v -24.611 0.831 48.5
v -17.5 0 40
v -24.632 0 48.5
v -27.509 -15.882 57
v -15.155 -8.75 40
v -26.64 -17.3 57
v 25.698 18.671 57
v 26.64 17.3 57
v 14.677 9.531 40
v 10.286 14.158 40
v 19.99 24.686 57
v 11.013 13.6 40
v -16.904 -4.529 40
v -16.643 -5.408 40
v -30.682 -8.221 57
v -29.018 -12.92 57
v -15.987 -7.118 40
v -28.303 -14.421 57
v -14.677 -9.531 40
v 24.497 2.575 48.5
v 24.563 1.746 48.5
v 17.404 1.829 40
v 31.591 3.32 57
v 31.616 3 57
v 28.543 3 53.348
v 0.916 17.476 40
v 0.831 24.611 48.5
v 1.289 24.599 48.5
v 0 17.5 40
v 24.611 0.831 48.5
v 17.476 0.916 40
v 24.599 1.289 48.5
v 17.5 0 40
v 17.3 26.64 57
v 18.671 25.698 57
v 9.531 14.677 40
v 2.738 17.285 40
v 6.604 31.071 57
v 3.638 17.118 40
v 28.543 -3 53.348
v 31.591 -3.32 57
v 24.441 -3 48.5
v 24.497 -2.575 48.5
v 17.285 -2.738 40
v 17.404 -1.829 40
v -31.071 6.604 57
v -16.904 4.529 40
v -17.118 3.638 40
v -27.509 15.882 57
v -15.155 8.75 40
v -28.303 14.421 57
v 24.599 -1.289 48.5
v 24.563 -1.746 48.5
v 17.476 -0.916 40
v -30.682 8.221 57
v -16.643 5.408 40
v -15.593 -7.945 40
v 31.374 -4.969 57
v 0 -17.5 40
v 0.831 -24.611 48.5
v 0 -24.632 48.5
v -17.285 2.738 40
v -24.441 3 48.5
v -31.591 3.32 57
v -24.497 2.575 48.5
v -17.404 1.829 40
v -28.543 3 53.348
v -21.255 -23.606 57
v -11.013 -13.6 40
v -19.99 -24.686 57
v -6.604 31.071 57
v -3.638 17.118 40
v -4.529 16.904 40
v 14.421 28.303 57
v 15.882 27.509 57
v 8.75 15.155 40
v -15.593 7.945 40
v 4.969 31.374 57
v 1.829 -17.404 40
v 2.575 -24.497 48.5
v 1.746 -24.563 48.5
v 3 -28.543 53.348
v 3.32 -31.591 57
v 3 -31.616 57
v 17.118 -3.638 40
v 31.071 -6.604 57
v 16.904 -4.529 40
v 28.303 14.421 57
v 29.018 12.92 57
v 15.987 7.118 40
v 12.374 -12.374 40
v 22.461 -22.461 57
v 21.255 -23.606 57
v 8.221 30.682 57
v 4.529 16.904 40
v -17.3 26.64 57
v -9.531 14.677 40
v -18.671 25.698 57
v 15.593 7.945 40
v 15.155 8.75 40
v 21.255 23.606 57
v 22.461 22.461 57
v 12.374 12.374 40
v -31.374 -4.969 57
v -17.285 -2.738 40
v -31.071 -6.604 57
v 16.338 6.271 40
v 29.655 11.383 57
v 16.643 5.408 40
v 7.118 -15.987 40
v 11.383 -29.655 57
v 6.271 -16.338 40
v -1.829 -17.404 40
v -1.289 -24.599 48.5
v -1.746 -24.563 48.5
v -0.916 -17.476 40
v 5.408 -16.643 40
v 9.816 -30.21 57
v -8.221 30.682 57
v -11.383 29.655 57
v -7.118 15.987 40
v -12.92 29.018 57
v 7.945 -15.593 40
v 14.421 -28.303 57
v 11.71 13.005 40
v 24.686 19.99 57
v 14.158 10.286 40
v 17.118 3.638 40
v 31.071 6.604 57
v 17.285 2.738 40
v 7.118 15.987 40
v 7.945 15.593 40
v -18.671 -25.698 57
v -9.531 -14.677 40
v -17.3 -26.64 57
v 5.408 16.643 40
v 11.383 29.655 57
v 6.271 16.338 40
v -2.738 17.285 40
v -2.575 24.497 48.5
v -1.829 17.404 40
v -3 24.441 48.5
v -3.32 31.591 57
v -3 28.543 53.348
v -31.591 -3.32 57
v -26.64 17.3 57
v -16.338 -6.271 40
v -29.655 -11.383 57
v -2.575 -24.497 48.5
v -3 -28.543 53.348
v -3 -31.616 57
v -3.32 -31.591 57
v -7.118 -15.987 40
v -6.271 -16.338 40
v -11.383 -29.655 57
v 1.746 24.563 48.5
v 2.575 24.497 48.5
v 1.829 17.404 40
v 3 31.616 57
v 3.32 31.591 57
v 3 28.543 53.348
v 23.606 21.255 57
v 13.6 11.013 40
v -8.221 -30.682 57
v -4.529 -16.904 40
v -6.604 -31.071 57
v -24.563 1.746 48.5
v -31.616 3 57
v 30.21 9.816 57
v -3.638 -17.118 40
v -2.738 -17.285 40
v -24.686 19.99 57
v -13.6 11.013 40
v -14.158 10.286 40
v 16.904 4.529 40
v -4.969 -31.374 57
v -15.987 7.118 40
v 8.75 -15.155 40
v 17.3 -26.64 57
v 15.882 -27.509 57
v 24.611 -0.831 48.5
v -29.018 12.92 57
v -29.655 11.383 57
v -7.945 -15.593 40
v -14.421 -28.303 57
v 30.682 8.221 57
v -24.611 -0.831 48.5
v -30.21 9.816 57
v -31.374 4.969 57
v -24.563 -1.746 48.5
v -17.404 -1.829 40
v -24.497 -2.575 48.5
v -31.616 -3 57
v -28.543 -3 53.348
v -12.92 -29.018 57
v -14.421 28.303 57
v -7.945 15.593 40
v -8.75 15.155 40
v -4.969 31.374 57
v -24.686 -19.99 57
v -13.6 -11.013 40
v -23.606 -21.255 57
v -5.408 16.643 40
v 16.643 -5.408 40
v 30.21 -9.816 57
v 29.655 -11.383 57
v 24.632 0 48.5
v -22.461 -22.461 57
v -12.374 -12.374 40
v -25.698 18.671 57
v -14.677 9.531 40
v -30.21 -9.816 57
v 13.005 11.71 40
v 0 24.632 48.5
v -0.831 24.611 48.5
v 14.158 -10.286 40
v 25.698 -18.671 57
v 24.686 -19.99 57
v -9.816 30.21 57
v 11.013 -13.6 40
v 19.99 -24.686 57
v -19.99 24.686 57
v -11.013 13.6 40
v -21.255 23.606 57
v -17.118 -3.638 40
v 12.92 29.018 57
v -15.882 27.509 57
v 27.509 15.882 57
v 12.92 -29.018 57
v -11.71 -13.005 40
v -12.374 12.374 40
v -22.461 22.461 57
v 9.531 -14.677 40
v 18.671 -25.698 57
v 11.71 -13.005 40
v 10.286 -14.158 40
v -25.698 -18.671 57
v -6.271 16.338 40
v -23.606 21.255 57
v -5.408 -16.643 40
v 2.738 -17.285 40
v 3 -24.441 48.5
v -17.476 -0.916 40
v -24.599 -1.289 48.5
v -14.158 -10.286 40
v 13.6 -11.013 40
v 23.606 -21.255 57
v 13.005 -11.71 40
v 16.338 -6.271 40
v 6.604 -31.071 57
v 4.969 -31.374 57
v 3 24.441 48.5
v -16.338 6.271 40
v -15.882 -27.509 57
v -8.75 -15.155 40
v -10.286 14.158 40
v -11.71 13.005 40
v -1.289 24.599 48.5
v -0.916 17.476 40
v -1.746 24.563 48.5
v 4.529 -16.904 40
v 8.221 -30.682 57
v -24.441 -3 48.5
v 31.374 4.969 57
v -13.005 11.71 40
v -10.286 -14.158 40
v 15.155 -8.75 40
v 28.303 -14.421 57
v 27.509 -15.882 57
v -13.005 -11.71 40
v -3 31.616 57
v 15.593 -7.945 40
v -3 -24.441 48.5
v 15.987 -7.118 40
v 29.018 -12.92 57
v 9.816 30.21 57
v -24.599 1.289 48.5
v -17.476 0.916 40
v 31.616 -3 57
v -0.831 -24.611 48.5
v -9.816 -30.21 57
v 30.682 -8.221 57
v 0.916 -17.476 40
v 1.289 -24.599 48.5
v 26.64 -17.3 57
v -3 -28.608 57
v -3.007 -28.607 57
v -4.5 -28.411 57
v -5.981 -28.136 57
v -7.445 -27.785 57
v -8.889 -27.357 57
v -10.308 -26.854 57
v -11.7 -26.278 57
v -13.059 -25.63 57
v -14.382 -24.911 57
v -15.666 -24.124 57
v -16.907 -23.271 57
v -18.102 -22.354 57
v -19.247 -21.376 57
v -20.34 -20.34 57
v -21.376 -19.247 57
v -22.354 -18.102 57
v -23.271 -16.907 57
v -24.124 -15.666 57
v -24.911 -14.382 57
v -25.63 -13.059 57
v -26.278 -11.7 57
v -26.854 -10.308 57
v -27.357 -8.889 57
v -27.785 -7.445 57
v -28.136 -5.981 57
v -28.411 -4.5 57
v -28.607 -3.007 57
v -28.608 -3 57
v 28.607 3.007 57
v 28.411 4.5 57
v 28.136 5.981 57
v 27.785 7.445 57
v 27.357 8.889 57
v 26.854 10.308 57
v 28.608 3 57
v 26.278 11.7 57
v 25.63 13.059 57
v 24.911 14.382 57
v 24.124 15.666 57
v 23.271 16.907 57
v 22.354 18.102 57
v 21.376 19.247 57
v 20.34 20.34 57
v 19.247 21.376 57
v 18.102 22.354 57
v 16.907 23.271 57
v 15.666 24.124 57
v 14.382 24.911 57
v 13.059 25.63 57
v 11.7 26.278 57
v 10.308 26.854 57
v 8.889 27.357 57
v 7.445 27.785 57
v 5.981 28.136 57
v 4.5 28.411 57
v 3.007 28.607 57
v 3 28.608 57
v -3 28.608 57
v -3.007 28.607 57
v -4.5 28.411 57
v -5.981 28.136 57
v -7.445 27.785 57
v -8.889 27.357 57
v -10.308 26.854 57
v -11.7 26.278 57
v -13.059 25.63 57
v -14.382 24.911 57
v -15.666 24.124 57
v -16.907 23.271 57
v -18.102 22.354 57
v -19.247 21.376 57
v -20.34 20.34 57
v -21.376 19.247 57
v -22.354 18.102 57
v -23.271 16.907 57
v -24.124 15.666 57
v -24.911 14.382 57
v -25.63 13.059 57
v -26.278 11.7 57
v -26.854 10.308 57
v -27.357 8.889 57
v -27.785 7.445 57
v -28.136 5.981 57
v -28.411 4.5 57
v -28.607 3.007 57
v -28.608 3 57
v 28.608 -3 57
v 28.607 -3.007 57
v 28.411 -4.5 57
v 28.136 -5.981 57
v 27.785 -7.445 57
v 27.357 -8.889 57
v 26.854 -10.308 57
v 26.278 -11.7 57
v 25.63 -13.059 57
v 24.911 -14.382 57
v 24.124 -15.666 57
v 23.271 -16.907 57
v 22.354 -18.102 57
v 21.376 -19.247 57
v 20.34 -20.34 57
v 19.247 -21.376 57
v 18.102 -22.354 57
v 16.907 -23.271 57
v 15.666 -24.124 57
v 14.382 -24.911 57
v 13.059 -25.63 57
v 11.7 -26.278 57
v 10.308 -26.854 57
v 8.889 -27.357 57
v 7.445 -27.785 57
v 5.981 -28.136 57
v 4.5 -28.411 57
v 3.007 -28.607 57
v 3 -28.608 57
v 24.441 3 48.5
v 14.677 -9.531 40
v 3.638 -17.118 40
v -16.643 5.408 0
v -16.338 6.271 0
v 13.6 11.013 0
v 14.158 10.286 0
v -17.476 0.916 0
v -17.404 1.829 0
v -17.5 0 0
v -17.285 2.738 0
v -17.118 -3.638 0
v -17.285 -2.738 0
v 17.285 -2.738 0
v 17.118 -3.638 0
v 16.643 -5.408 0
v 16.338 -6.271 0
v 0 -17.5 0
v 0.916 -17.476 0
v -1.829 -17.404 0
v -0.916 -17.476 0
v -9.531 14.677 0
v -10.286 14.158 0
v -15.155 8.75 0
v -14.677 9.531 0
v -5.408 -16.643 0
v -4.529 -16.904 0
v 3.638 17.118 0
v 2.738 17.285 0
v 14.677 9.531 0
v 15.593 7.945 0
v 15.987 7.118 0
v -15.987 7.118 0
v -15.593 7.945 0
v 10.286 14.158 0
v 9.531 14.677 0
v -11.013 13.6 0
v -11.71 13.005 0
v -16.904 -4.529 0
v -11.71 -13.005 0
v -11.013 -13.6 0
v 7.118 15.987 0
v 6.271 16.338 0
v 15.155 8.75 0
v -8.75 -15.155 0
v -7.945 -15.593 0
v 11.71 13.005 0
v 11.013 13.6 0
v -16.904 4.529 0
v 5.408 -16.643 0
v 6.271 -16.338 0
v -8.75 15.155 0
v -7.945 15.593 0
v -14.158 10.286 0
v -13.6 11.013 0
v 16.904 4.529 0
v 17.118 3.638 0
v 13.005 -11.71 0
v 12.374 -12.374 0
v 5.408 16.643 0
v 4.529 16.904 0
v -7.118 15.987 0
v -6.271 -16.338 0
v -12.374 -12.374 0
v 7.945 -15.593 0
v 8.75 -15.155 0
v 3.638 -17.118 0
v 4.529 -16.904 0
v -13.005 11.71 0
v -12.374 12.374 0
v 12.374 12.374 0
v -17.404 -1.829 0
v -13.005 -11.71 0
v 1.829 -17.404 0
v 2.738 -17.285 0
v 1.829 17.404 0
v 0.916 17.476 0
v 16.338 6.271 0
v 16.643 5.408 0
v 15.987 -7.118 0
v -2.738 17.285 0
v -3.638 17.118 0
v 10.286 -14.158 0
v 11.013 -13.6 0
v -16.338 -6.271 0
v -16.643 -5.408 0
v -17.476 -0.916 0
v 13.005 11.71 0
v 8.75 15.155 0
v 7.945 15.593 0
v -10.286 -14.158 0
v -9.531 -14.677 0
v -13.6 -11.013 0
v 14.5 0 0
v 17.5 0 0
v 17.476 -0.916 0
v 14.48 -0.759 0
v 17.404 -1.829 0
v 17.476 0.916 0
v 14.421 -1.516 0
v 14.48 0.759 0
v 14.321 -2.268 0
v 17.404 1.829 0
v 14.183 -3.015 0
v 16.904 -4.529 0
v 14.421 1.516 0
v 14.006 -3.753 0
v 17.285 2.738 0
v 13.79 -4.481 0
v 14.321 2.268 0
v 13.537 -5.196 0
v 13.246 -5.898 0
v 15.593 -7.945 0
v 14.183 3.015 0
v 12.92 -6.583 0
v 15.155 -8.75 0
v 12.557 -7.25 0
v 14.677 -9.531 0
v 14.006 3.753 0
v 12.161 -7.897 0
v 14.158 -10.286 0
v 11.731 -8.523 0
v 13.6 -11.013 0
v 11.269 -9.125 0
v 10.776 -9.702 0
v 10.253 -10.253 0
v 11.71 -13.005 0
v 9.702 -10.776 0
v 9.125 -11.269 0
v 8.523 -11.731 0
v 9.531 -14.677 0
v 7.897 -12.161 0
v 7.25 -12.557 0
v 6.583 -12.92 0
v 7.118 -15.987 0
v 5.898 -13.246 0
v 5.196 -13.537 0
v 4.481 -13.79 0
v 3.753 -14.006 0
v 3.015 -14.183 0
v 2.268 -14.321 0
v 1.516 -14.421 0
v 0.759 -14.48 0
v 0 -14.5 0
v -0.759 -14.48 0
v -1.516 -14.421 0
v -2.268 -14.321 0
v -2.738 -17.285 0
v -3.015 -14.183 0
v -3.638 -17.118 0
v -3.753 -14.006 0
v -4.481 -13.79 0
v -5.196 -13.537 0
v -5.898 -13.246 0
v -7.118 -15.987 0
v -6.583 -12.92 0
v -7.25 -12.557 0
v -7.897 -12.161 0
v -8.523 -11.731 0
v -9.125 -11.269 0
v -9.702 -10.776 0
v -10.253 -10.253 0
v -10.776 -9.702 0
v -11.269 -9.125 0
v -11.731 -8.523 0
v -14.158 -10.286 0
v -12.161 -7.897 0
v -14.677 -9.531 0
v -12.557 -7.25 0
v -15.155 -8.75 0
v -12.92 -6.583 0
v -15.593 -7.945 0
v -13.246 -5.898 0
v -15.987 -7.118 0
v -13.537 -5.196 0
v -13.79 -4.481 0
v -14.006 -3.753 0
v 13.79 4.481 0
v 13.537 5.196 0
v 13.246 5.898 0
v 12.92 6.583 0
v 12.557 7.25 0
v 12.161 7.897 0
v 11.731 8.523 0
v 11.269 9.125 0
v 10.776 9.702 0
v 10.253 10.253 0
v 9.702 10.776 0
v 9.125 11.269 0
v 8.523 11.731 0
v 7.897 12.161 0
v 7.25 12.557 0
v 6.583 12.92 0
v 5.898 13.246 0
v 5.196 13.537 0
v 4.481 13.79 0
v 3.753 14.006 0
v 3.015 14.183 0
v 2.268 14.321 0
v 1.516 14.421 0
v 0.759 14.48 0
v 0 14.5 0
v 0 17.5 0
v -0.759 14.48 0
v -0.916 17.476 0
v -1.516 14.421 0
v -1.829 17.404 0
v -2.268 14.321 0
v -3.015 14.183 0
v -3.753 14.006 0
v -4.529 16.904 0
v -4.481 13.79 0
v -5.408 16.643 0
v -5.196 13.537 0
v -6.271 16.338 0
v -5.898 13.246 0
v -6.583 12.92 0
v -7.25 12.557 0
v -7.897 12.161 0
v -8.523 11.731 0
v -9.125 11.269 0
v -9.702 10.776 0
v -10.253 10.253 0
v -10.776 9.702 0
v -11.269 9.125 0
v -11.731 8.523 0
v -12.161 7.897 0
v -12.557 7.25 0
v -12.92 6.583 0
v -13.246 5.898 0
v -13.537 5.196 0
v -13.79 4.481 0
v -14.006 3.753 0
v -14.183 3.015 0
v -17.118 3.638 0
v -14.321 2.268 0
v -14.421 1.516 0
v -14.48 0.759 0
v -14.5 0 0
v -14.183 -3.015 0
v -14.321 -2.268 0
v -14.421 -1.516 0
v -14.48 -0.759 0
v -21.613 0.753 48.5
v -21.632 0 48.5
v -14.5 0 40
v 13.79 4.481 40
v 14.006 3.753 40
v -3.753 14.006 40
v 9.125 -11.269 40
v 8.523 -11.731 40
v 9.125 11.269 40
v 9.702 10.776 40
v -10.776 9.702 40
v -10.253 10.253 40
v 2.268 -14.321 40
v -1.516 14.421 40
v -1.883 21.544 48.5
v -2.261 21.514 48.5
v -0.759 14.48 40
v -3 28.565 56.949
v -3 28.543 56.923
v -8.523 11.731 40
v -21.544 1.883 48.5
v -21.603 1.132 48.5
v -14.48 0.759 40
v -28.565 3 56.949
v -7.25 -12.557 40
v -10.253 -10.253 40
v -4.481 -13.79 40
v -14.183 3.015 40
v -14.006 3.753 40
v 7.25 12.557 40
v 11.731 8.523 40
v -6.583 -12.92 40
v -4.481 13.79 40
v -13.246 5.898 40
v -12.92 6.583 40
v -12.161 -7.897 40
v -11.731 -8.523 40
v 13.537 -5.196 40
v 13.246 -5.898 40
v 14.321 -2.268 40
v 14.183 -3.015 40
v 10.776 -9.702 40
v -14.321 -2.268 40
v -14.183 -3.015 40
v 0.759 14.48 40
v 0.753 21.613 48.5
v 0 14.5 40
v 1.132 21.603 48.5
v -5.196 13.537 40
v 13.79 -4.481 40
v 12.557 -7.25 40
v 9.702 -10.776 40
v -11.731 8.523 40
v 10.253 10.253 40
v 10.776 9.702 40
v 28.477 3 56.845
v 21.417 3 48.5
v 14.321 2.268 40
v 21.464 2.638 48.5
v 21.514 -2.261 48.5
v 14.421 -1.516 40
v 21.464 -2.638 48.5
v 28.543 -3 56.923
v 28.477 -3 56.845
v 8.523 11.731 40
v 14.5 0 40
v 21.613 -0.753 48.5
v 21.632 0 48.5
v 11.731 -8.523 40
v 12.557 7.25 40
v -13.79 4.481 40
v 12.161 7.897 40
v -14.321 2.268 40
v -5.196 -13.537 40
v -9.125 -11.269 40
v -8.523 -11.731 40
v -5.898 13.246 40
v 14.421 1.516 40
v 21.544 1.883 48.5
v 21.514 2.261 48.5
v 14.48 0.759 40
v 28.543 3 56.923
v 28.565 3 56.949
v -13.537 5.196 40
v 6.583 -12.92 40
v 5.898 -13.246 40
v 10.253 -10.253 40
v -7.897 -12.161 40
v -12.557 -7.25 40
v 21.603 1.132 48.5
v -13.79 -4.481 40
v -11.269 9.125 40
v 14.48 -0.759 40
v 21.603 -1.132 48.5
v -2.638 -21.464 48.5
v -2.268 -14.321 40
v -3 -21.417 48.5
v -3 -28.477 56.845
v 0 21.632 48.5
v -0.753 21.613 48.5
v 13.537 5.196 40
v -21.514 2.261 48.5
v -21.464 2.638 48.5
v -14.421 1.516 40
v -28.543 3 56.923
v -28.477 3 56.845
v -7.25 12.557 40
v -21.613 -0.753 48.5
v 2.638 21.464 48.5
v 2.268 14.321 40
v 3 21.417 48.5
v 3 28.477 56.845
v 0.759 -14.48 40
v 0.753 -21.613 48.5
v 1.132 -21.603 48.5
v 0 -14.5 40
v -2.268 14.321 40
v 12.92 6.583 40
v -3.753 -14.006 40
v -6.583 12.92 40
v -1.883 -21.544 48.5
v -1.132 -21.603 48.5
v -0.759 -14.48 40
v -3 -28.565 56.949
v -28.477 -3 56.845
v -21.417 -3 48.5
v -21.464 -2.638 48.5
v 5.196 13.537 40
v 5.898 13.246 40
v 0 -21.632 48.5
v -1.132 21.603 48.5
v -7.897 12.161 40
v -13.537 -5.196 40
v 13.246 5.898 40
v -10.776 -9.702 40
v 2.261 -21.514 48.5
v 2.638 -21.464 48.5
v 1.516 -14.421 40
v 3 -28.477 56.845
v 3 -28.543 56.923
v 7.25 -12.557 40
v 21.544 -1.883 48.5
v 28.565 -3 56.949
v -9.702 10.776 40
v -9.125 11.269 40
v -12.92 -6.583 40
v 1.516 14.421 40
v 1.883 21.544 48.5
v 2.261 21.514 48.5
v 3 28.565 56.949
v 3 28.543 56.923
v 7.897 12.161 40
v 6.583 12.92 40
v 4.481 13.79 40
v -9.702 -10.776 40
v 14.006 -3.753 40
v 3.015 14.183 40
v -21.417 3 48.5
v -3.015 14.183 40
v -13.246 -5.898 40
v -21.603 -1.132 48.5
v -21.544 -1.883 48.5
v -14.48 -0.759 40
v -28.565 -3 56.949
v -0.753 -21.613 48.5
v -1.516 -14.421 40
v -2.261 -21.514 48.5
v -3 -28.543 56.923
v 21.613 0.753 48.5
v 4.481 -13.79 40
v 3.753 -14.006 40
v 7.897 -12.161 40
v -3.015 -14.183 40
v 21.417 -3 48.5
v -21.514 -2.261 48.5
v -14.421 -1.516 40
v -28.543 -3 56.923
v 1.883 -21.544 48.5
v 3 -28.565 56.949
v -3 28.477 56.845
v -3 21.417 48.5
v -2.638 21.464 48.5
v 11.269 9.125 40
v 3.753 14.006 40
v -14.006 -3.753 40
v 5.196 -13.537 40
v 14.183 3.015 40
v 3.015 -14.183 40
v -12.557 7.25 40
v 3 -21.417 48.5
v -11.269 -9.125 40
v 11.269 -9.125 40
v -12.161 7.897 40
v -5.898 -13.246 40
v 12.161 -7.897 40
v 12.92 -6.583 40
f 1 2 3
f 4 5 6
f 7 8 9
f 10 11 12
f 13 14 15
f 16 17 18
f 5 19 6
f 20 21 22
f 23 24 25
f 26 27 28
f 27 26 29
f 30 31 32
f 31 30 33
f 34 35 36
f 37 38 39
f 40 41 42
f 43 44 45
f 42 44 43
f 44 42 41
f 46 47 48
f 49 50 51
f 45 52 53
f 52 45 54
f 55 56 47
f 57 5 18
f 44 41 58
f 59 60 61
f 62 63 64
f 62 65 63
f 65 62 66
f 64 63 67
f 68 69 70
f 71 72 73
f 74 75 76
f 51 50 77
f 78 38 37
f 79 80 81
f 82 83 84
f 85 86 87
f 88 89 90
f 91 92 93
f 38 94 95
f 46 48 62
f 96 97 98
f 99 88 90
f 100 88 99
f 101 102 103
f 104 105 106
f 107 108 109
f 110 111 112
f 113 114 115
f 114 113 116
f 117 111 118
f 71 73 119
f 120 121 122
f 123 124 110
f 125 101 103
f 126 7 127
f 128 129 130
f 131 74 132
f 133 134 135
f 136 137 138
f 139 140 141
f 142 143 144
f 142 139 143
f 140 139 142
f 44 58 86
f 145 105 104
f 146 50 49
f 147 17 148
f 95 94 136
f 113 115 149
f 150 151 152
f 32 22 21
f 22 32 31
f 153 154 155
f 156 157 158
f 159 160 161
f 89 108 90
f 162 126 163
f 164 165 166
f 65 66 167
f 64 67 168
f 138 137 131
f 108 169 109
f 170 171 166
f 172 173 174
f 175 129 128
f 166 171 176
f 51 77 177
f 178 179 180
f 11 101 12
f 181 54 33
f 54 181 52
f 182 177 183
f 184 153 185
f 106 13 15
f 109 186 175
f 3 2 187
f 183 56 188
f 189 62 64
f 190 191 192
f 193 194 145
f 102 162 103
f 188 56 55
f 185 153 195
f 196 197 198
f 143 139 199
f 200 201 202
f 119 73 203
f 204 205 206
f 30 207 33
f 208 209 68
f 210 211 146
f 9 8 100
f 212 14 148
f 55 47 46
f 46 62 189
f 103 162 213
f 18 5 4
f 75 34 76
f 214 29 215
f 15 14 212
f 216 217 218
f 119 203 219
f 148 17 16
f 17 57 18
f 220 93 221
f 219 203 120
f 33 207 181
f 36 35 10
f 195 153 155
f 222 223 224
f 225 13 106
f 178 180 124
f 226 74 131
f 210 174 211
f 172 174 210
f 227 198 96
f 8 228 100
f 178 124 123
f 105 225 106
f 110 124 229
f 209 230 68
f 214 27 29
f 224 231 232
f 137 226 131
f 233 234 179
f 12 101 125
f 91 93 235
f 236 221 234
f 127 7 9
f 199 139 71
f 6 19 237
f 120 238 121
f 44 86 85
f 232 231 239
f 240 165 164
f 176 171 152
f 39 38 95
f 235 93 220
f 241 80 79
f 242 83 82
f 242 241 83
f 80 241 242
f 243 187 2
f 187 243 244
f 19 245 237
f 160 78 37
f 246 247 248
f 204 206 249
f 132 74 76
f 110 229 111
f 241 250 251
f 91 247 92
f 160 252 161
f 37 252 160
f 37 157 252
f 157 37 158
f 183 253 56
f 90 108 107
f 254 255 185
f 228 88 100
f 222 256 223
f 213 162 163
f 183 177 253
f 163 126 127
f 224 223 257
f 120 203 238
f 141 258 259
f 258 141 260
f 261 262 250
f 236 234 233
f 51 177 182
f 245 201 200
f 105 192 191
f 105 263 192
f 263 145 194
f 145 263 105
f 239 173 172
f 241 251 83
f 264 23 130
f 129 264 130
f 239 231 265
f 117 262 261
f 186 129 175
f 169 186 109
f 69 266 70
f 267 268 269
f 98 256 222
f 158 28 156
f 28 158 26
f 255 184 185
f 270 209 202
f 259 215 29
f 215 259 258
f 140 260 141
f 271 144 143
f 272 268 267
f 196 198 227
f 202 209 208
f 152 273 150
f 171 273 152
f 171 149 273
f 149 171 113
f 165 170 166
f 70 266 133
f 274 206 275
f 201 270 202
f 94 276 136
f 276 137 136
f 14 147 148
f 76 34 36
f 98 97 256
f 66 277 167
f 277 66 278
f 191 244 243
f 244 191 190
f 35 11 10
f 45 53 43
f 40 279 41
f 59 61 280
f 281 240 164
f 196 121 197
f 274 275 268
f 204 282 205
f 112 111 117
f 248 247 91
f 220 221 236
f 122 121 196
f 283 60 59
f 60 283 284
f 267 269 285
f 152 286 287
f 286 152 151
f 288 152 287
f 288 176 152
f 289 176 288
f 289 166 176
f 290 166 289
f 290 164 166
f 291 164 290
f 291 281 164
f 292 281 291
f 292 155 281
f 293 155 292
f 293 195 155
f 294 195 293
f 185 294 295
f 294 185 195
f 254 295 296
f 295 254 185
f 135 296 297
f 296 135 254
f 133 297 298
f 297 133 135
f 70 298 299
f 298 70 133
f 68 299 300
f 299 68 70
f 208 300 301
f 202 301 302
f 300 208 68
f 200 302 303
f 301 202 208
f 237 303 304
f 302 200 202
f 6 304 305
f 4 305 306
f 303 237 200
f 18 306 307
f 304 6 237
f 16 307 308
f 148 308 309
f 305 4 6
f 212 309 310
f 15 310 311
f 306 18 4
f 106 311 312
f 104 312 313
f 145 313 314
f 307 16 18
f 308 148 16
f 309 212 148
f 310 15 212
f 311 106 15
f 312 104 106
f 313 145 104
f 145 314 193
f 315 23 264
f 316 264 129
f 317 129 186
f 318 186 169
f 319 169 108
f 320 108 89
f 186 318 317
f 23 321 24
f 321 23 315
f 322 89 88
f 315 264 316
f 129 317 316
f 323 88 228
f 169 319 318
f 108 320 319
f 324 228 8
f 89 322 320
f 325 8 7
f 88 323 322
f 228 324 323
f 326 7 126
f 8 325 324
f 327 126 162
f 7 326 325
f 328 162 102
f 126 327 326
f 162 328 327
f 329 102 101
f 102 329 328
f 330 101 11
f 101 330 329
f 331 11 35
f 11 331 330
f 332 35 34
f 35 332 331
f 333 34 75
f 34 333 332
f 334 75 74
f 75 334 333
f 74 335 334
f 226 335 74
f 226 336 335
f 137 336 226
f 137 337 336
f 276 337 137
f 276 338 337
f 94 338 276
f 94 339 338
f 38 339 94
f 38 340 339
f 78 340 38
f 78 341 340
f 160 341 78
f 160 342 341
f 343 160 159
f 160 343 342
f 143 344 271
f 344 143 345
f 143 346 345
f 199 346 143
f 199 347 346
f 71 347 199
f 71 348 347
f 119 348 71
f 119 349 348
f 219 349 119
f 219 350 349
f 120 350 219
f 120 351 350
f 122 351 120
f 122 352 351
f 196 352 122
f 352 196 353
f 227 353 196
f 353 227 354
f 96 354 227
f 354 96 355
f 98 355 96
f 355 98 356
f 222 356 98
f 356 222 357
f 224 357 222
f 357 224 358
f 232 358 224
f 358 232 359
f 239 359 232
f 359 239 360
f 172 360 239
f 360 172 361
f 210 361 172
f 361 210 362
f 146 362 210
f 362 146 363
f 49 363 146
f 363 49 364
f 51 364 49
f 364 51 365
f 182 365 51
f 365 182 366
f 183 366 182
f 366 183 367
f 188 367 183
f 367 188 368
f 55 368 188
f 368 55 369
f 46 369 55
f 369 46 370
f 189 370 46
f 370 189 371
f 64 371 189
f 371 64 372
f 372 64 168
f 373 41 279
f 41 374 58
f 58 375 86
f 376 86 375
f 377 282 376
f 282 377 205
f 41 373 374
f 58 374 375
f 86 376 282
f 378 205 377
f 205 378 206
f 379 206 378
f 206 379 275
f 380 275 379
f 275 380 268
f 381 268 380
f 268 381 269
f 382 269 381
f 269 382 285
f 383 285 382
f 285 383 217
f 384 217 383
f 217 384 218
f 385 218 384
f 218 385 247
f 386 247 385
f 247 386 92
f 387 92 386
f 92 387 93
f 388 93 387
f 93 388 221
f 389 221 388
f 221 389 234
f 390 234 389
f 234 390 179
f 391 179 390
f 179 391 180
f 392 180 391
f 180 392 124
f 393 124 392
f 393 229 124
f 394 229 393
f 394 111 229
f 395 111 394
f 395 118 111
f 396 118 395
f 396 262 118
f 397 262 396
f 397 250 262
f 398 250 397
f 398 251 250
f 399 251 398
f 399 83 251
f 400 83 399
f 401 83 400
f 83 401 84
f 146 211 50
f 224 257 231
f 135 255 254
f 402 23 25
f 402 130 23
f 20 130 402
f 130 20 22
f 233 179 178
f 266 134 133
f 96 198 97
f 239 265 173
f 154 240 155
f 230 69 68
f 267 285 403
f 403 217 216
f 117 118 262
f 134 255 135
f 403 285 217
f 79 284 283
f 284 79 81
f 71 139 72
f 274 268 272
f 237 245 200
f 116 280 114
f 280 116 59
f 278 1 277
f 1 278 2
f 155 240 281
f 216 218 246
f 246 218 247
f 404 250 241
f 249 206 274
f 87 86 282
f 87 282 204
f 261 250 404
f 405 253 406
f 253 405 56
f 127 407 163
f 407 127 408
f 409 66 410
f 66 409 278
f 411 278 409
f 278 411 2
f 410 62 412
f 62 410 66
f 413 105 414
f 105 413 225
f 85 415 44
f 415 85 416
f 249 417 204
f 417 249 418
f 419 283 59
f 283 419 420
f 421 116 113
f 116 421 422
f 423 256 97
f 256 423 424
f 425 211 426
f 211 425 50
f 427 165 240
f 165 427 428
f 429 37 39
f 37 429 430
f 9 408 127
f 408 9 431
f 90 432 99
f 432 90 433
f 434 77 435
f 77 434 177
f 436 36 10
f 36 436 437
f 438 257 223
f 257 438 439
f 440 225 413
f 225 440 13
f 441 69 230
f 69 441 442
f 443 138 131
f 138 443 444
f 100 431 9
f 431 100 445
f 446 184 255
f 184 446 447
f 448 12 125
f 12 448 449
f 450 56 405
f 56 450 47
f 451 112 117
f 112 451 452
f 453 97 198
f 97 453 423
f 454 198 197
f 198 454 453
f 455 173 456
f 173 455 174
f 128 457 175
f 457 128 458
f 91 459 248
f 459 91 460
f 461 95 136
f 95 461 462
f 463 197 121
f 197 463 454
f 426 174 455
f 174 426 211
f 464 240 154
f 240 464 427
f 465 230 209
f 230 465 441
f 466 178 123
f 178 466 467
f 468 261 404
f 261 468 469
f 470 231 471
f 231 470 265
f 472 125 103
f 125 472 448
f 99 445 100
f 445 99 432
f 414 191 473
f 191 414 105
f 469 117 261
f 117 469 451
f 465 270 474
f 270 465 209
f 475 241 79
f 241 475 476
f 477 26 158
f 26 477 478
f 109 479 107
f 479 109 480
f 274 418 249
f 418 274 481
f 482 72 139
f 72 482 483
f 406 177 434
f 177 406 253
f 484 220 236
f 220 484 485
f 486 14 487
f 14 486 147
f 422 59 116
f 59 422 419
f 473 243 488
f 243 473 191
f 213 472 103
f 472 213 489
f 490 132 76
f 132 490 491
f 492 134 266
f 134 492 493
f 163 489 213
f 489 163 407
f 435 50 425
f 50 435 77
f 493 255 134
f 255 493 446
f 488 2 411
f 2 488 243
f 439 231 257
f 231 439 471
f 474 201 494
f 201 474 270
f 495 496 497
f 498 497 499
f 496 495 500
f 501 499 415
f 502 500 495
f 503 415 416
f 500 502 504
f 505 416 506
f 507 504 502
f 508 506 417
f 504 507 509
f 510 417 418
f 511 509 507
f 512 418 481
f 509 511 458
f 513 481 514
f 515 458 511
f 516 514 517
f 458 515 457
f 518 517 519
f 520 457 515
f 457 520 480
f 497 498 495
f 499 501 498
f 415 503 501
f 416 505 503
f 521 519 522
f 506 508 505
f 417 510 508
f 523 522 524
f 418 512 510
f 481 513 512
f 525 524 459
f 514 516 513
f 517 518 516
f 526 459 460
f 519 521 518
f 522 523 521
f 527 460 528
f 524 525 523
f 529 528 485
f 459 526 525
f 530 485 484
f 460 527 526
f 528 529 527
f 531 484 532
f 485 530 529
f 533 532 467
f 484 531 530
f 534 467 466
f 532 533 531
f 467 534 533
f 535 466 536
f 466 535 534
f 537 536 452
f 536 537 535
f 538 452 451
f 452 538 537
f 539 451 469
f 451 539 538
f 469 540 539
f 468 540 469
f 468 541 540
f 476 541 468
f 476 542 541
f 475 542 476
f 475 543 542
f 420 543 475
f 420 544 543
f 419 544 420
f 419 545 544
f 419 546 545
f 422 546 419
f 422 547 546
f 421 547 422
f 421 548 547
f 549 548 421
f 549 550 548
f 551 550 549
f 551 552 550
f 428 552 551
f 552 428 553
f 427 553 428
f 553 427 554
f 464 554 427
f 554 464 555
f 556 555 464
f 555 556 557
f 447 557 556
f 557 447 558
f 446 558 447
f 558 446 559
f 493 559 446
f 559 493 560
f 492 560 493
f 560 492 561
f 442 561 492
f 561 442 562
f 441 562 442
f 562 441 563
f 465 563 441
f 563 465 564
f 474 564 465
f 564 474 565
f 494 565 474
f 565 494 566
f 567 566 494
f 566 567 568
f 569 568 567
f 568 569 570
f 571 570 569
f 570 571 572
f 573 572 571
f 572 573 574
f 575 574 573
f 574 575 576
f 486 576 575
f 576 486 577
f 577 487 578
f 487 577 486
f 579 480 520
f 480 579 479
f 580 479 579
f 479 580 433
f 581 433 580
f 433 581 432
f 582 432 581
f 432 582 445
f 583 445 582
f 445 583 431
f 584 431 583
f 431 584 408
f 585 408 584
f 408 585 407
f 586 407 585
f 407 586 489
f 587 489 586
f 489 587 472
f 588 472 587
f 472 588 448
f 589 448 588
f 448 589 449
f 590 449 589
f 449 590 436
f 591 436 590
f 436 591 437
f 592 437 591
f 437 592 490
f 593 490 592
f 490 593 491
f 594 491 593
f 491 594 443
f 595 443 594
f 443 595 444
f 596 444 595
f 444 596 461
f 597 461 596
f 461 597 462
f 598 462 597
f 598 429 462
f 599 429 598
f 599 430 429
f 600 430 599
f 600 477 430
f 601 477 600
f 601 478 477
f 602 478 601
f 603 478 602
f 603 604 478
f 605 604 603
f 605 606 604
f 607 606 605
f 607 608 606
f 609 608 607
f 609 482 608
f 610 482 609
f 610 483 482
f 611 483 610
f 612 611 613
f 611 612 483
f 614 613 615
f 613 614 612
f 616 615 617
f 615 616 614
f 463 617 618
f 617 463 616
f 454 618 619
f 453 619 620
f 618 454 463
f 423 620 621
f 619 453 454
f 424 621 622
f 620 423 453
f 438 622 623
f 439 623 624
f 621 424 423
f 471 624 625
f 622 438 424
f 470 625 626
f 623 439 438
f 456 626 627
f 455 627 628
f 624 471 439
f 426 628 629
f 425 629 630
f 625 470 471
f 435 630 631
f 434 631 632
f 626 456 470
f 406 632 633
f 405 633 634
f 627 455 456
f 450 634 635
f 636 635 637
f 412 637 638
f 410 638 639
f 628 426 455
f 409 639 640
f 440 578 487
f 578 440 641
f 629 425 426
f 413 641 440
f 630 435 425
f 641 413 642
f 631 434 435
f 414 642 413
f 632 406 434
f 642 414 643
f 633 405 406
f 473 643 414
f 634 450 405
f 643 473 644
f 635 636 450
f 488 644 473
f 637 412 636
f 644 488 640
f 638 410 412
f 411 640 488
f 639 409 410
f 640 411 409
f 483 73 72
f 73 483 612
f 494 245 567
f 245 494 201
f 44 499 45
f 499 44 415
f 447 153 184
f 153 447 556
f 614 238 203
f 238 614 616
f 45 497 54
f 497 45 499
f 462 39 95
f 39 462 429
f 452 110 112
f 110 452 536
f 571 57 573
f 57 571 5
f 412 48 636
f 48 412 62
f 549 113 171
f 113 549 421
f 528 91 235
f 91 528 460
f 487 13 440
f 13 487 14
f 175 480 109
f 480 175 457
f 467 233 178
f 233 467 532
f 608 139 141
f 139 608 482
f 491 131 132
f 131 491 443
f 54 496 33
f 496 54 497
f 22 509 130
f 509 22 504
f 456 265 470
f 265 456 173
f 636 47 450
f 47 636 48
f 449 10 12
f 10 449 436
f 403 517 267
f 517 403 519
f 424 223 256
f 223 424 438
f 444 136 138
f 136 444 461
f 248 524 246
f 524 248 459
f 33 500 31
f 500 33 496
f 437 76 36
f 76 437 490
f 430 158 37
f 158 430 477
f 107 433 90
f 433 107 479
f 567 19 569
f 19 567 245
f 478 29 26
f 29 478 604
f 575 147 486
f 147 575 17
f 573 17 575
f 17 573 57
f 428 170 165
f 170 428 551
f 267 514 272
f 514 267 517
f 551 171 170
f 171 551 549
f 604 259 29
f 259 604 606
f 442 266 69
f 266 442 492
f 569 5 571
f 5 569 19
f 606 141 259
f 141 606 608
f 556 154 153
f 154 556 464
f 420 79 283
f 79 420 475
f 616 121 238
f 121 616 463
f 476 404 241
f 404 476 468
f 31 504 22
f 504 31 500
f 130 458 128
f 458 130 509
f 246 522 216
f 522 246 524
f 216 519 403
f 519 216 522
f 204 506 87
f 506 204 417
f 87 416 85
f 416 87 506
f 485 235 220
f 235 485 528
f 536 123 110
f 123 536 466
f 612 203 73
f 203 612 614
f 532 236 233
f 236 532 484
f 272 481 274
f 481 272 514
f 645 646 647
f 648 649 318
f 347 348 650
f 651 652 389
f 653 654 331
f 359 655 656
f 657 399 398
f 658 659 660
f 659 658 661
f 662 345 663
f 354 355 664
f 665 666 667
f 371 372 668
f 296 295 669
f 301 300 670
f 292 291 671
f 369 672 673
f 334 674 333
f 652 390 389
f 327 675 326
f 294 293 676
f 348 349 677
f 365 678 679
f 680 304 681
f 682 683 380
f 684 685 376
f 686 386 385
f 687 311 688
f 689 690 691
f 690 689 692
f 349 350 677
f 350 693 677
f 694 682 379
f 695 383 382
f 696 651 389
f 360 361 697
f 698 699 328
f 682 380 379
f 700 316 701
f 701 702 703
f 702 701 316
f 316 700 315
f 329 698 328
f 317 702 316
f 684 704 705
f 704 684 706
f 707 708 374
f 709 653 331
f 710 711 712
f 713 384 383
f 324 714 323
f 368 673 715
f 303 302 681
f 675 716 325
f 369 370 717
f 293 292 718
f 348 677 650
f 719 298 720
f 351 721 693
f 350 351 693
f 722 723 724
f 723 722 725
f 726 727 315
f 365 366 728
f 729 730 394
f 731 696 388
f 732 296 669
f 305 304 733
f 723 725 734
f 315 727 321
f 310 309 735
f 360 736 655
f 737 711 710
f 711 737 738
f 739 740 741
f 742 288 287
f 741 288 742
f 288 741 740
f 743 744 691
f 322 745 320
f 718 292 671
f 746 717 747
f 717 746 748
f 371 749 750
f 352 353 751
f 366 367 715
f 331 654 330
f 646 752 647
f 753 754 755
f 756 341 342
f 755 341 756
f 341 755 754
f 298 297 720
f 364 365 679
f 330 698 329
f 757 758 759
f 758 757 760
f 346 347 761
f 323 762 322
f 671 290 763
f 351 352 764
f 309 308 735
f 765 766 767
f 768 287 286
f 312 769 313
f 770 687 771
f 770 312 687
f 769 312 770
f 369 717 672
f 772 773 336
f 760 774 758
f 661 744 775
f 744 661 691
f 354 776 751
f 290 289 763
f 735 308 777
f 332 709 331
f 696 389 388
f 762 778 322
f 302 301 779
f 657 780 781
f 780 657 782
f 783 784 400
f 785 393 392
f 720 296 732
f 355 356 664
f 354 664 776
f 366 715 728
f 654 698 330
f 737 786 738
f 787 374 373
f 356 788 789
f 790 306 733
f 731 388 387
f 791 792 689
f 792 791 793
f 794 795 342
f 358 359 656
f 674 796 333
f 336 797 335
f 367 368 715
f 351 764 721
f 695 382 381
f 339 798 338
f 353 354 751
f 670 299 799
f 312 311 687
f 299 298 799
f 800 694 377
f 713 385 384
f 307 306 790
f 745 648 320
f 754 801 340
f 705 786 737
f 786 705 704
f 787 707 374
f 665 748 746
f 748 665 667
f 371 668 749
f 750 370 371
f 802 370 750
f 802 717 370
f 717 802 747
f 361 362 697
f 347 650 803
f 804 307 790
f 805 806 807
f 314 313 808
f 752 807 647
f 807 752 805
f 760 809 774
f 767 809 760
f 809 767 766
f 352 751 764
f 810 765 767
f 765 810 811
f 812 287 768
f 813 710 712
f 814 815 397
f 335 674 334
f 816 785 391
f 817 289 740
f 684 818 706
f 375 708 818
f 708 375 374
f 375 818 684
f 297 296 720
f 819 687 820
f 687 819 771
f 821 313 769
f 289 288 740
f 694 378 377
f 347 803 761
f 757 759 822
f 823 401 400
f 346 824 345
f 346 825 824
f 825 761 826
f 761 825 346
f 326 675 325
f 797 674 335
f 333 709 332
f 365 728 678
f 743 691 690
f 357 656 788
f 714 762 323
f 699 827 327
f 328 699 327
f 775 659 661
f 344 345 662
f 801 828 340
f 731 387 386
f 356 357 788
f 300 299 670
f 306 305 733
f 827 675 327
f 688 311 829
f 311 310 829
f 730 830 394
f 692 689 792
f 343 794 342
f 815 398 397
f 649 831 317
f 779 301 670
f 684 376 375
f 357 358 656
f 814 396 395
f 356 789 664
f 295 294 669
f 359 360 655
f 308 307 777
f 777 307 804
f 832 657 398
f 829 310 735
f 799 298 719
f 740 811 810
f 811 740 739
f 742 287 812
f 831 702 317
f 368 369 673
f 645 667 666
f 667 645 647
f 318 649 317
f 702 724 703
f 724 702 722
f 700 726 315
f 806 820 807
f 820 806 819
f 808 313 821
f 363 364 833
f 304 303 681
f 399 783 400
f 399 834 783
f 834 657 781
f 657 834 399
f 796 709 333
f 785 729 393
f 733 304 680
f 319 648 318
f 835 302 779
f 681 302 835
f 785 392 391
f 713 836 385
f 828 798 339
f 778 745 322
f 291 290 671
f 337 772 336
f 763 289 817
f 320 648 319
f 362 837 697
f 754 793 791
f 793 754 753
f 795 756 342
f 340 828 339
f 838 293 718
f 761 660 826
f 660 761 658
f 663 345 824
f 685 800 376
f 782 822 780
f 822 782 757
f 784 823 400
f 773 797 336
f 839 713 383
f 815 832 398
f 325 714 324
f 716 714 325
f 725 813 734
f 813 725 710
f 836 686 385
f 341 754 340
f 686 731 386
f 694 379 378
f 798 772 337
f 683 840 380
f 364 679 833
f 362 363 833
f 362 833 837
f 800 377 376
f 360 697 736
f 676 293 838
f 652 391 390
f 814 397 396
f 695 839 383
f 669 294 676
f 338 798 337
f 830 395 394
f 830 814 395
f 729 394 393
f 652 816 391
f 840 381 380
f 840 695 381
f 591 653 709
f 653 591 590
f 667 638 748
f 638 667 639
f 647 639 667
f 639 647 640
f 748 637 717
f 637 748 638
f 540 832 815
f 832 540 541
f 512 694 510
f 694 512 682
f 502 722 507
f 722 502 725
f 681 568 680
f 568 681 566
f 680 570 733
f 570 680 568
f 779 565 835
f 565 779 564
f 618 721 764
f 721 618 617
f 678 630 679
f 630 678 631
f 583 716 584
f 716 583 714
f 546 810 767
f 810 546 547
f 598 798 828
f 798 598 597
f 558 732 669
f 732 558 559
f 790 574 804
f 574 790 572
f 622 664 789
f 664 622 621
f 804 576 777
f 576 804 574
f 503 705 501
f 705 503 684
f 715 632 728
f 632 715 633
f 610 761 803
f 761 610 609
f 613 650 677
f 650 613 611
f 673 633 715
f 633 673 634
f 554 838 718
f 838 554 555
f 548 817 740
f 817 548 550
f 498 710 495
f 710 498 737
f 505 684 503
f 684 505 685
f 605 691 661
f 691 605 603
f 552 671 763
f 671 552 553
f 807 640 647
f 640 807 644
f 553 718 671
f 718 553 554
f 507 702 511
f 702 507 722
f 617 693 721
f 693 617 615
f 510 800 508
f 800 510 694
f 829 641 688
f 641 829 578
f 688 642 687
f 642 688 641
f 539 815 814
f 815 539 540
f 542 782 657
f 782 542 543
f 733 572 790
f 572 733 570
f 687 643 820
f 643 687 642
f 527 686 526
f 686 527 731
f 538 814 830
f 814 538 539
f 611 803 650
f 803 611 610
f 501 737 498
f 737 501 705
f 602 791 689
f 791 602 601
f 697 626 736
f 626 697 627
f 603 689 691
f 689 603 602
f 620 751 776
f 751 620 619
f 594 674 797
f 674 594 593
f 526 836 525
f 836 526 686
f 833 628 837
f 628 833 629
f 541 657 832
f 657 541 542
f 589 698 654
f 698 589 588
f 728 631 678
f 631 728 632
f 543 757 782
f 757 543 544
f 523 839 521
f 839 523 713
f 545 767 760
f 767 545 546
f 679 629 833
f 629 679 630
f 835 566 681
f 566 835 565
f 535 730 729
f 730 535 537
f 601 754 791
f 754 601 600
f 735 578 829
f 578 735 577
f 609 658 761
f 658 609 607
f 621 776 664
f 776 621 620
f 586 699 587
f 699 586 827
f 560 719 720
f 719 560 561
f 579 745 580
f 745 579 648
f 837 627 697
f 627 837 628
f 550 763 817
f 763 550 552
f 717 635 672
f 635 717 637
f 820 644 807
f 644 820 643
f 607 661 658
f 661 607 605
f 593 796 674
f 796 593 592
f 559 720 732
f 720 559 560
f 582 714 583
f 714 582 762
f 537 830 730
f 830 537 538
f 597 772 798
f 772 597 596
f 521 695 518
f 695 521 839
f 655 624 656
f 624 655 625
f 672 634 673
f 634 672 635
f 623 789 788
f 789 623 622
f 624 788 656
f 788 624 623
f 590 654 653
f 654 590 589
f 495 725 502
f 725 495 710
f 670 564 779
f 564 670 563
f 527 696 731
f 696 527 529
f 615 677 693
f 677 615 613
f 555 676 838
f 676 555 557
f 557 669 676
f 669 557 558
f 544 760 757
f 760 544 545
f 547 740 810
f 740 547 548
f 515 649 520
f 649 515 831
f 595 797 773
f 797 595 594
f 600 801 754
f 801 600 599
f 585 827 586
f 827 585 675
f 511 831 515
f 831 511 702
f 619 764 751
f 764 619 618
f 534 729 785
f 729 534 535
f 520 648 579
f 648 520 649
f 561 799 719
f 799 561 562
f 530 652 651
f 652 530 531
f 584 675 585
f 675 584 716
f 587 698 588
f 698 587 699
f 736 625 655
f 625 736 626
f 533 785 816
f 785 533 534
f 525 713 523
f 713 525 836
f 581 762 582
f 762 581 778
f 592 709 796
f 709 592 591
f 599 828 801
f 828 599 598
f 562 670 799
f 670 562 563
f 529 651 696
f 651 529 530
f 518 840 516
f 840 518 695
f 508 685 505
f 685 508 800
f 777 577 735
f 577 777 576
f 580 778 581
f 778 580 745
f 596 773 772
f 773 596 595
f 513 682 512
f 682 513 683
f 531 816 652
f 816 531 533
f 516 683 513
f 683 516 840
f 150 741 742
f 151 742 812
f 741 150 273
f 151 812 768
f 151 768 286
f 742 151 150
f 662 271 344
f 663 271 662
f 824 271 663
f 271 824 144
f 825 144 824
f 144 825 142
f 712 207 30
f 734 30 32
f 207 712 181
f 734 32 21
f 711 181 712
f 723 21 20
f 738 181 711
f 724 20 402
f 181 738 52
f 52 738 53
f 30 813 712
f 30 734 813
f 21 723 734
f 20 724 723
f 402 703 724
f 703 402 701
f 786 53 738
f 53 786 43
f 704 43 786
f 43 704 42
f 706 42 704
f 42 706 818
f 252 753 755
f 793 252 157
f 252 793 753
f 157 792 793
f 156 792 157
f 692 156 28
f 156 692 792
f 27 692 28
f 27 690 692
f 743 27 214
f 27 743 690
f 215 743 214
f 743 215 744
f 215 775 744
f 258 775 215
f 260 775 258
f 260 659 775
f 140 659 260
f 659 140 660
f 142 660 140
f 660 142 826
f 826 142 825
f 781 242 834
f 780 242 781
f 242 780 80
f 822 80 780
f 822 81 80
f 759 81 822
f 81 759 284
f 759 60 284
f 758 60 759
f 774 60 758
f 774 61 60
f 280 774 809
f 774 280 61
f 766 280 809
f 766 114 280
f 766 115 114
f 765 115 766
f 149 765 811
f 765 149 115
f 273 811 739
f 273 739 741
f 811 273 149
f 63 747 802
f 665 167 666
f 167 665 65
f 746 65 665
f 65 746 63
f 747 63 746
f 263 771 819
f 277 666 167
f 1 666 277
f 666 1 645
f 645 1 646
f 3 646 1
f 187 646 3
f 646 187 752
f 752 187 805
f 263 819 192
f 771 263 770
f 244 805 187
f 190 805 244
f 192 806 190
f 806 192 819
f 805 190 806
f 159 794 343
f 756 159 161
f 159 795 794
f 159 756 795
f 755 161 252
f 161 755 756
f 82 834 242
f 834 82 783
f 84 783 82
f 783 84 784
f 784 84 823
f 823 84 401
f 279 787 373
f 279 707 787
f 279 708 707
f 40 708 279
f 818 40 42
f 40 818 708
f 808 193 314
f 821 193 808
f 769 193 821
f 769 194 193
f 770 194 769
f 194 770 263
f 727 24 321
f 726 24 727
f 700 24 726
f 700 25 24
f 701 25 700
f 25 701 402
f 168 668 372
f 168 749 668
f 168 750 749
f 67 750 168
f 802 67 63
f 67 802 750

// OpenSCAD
// make a stand to invert bottles
// dave312/20190615

$fn=120;

// diameter of the neck
neckD=29;						// [10:100]

// height of the neck
neckH=40;						// [10:100]

// height of the base (angled part)
standH=17;					    // [10:100]

// angle for the base
standA=40;						// [0:45]

// thickness of the walls
wall=3;							// [0:0.1:5]

standD=(tan(standA)*standH)*2+neckD;


rotate([0,180,0]) translate([0,0,-1*(neckH+standH)])
difference() {
	makeTube(standH,standD+2*wall,neckH,neckD+2*wall);
	makeTube(standH,standD,neckH,neckD);
	for(m=[0:90:180]) {
		rotate([0,0,m]) cube([wall*2,standD*2,standH],center=true);
	}
}

// makes a tube
module makeTube(myH1,myD1,myH2,myD2) {
	union() {
		cylinder(h=myH1,r2=myD2/2,r1=myD1/2);
		translate([0,0,myH1]) cylinder(h=myH2,r=myD2/2);
	}
}
